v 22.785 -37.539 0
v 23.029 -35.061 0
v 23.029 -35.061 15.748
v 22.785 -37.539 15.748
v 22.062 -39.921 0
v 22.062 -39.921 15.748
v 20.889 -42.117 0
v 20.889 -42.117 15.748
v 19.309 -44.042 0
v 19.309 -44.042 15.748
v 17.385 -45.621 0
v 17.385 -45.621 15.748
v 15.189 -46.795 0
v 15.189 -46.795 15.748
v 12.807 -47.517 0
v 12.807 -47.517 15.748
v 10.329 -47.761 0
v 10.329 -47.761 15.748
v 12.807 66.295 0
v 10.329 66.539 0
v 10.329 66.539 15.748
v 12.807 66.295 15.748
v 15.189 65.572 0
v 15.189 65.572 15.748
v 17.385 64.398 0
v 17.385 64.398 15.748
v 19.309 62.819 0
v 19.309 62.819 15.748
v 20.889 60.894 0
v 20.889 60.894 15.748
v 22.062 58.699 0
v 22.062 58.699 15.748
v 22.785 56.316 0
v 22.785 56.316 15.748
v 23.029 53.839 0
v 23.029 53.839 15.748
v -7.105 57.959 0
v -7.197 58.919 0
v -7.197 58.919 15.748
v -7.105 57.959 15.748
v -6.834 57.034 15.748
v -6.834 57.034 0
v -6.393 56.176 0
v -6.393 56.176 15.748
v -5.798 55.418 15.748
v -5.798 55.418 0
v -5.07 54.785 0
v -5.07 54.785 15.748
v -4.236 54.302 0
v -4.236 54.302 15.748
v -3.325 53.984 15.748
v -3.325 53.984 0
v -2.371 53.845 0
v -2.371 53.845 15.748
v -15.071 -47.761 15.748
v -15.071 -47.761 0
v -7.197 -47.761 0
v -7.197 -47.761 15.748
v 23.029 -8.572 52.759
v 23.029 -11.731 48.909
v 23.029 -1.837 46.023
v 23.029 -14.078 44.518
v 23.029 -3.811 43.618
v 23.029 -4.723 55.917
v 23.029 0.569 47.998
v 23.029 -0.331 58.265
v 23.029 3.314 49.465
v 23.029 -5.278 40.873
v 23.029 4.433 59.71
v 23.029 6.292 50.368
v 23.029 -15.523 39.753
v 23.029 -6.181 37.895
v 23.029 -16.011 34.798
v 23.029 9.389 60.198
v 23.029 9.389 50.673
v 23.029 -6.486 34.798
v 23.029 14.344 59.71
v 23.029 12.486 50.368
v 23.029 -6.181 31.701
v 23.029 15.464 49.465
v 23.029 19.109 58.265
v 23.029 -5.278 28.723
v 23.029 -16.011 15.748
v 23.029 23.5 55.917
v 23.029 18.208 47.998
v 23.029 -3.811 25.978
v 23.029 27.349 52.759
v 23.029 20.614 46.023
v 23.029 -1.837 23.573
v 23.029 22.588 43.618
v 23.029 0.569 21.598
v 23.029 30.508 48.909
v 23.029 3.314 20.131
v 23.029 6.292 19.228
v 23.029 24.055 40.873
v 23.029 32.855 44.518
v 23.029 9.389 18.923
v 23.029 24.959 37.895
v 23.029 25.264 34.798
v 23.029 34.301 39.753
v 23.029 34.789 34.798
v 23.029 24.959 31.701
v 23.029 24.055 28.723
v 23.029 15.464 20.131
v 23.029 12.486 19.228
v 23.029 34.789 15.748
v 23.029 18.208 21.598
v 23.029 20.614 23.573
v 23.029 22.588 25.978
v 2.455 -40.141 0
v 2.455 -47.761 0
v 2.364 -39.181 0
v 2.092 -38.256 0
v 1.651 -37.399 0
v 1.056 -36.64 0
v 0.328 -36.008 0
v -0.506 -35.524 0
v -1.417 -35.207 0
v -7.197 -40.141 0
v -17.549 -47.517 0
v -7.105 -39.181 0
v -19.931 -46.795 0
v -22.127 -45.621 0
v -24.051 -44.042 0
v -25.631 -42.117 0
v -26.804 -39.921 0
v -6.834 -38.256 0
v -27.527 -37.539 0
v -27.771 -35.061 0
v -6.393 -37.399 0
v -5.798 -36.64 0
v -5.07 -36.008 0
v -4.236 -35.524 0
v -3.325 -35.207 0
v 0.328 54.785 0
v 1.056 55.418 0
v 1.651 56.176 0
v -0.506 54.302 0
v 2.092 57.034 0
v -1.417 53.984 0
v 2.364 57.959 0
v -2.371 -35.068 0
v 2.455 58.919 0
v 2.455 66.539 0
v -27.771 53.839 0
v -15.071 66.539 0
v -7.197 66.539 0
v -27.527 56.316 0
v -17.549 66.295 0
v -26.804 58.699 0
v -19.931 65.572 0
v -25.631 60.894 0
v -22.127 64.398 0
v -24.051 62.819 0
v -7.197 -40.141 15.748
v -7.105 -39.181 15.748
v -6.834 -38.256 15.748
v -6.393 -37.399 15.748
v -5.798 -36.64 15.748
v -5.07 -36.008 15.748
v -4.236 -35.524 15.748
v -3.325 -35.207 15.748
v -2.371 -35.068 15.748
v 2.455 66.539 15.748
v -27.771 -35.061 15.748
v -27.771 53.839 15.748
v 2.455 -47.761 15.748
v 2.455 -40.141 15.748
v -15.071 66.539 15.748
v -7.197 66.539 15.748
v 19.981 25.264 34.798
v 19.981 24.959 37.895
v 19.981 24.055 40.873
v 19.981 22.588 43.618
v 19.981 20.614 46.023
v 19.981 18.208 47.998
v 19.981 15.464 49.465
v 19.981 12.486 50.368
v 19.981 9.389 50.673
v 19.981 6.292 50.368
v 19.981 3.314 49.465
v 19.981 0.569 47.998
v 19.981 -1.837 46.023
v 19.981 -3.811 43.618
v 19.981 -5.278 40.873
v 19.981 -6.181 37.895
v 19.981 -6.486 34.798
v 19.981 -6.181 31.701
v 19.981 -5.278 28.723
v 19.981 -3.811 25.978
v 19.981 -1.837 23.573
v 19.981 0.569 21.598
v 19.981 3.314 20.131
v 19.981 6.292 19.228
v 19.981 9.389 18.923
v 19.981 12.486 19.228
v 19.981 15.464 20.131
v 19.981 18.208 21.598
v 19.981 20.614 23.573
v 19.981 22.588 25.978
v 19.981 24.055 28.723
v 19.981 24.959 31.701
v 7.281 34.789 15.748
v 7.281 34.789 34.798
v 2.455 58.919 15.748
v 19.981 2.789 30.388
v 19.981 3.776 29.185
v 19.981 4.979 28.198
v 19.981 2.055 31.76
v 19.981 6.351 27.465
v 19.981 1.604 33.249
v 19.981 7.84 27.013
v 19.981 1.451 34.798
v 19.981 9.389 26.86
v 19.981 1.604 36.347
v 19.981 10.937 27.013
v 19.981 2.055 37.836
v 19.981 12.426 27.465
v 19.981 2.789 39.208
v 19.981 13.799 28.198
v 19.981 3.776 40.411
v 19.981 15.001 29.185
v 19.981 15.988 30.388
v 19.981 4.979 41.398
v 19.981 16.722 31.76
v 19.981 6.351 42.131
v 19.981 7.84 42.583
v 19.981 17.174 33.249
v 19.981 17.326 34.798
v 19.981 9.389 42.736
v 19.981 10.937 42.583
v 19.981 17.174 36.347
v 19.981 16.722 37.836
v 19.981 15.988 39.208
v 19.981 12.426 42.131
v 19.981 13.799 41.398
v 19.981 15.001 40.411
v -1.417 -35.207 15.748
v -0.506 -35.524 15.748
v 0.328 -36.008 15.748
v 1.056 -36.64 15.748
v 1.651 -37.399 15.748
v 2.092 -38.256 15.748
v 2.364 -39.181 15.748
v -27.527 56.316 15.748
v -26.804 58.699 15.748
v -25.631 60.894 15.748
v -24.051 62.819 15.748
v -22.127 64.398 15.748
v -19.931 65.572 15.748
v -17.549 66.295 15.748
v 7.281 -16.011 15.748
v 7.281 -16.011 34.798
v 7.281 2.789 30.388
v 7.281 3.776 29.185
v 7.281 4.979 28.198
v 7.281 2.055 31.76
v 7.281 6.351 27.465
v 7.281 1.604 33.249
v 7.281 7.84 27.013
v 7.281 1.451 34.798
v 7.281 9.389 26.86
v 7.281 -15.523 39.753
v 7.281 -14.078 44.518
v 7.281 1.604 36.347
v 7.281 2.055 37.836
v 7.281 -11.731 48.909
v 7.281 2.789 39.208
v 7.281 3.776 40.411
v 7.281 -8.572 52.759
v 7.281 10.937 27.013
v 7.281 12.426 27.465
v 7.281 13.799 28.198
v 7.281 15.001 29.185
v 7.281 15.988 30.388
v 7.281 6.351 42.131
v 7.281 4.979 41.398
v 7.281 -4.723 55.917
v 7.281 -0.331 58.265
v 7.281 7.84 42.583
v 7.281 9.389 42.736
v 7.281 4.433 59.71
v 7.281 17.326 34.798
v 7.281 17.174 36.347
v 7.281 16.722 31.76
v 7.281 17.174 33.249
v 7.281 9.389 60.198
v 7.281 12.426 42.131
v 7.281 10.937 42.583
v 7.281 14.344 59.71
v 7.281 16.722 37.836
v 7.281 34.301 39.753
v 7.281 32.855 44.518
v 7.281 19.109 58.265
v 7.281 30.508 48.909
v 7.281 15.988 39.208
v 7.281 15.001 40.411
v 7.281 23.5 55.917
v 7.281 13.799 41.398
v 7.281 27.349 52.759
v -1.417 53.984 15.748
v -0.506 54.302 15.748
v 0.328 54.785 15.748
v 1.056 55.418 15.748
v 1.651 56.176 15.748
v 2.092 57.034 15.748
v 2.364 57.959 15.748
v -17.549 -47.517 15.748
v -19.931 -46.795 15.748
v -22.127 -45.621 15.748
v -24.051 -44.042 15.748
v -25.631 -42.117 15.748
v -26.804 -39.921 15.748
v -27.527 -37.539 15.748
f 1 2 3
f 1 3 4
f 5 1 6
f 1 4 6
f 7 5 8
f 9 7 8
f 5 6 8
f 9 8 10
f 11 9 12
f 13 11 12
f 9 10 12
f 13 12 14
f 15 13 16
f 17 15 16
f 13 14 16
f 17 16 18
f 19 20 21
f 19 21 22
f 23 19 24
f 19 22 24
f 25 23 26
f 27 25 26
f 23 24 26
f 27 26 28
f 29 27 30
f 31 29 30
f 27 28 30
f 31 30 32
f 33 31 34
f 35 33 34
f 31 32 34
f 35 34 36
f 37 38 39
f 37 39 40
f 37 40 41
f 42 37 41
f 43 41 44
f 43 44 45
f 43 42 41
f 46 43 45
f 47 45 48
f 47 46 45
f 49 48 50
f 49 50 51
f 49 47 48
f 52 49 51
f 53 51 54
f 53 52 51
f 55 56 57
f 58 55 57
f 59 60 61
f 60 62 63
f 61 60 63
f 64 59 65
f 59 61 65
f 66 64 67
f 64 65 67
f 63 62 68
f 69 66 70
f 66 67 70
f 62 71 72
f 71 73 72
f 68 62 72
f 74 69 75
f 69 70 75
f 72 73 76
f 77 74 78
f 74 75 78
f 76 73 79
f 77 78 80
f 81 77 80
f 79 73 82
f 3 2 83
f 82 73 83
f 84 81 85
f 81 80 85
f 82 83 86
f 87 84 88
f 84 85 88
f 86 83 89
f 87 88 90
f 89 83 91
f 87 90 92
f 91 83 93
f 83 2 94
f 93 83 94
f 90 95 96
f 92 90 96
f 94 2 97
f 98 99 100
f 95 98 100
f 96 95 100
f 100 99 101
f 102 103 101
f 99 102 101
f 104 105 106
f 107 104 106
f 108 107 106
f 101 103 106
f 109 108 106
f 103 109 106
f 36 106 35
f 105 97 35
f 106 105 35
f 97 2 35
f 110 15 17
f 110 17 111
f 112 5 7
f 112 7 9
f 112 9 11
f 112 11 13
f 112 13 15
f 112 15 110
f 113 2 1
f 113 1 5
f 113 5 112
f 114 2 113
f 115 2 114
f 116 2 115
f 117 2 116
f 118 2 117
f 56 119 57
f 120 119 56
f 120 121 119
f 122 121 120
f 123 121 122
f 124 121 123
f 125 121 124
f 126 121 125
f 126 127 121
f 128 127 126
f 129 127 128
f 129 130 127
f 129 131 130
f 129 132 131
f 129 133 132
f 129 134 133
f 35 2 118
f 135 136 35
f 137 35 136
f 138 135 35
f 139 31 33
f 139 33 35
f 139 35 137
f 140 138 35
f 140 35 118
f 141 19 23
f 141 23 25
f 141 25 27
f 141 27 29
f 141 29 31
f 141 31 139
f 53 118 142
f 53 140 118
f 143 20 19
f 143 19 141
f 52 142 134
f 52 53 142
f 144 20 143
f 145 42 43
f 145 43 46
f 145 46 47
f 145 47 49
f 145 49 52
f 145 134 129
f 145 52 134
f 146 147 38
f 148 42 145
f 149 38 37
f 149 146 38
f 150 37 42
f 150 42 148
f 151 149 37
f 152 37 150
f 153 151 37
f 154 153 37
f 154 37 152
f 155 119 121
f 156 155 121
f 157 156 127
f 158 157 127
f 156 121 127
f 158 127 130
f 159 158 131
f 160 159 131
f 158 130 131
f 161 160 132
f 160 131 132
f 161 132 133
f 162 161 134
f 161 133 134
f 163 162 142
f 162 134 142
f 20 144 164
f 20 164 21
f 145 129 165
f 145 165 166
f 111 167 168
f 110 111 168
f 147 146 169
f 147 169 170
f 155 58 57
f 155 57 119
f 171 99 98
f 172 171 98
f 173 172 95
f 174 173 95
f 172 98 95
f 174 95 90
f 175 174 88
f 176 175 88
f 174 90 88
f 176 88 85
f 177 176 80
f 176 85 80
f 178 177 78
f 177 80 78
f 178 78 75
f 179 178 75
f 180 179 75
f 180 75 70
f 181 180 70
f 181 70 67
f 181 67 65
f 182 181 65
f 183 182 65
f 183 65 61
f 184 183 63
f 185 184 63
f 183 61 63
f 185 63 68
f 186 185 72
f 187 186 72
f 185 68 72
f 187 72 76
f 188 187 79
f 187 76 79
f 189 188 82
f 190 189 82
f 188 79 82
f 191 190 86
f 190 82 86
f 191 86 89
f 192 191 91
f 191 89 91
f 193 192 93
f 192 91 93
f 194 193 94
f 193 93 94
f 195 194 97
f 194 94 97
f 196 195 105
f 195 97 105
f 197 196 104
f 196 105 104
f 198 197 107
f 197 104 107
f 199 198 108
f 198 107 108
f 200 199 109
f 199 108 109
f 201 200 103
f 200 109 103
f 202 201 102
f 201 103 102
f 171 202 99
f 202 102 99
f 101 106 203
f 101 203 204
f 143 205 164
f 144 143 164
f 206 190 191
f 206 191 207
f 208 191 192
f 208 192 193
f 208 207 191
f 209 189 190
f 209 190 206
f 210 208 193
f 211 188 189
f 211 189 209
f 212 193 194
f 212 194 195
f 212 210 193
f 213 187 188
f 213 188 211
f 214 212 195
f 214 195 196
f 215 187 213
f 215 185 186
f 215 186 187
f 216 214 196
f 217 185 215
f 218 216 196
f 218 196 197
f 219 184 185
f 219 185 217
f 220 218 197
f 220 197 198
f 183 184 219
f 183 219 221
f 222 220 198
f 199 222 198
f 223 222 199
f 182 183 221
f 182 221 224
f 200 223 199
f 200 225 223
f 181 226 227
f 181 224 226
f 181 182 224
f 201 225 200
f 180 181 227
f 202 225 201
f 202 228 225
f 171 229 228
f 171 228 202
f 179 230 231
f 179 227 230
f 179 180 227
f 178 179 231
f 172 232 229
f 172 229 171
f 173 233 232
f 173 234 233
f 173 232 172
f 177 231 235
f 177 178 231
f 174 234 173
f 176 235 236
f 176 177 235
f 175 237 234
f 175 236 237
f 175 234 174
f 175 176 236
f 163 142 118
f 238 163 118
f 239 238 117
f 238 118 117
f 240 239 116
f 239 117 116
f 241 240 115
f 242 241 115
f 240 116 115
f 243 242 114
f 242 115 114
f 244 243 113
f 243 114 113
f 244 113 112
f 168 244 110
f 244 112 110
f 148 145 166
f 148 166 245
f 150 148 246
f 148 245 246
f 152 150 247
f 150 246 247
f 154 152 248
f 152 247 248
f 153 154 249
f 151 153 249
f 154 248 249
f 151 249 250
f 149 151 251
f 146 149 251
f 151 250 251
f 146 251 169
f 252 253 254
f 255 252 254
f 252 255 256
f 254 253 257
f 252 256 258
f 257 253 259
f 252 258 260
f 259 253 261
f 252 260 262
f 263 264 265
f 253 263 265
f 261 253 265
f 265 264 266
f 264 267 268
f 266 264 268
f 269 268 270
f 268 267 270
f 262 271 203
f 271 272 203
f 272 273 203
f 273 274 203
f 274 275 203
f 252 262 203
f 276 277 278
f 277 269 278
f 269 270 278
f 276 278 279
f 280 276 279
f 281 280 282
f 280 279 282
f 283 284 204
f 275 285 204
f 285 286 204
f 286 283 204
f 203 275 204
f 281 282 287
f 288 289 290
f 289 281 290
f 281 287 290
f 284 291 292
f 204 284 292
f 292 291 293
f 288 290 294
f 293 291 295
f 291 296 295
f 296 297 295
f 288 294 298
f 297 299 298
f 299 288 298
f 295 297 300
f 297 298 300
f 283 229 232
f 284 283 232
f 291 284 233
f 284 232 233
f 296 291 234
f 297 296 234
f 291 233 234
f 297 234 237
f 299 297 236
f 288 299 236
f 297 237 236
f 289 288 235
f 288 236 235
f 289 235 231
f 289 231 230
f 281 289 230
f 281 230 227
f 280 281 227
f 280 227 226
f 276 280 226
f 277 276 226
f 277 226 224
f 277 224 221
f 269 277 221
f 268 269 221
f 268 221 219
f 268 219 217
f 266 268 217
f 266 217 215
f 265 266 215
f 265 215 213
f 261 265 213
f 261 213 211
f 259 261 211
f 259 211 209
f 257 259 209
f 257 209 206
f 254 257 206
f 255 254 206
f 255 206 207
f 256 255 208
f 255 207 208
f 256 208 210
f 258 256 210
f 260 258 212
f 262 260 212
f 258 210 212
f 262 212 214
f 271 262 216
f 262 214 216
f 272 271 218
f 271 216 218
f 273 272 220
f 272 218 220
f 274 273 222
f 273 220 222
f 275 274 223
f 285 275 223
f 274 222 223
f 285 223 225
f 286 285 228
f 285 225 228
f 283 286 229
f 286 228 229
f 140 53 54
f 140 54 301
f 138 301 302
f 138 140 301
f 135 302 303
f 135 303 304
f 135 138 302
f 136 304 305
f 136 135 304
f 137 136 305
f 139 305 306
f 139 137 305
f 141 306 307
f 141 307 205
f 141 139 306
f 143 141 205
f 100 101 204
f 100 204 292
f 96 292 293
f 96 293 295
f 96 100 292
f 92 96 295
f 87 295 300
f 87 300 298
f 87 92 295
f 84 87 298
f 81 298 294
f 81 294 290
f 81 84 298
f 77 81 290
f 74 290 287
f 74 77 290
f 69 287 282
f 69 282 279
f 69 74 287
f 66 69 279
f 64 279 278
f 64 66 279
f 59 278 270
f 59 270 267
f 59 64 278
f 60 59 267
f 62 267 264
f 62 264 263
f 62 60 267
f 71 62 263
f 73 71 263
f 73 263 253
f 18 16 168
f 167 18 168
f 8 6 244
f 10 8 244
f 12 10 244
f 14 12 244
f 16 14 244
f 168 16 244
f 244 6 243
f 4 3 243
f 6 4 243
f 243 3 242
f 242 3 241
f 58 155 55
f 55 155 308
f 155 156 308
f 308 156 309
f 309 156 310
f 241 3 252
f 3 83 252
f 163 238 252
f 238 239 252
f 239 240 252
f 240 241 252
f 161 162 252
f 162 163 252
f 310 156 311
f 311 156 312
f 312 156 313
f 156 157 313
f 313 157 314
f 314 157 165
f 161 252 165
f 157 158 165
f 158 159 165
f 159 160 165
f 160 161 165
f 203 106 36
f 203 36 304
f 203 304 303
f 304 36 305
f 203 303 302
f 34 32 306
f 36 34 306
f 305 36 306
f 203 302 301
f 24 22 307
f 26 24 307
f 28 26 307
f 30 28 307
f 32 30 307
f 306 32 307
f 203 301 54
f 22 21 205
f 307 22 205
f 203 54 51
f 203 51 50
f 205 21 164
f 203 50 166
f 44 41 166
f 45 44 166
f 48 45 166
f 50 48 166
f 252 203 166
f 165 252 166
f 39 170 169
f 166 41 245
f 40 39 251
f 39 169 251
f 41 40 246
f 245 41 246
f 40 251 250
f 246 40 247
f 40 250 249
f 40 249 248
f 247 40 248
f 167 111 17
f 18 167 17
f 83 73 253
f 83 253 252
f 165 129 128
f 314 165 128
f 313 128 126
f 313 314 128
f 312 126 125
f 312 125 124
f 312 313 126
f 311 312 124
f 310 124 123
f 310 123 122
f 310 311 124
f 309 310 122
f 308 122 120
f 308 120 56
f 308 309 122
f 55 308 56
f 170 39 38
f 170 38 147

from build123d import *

# Parameters (mm, degrees)
F0_W        = 50.8
F0_H        = 114.3
F1_DEPTH    = 15.748
F2_W        = 9.652
F2_H        = 12.7
F3_DEPTH    = 25.4
F4_R        = 12.7
F5_T1_DEPTH = 15.748
F7_DEPTH    = 15.748
F8_R        = 15.875
F9_DEPTH    = 3.048
F10_R       = 7.9375
F11_DEPTH   = 25.4


# Not quite as in the source:
# - a fillet or chamfer that OpenCascade refuses, or shapes differently, is made with other operations: its cross-section is extruded or revolved along the edge and cut away or added


with BuildPart() as f1:
    # F0 (on Top) → F1 (new body)
    with BuildSketch(Plane.XY):
        with Locations((-2.3709591478, 9.3886919219)):
            Rectangle(F0_W, F0_H)
    extrude(amount=F1_DEPTH)

    # F2 (on face) → F3 (cut)
    with BuildSketch(Plane.XY.offset(15.748)):
        with Locations((-2.3709591478, -41.4113080781)):
            Rectangle(F2_W, F2_H)
        with Locations((-2.3709591478, 60.1886919219)):
            Rectangle(F2_W, F2_H)
    extrude(amount=-F3_DEPTH, mode=Mode.SUBTRACT)

    # F4
    f4_edges = [f1.edges().sort_by_distance(p)[0] for p in [
        (-27.770959, 66.538692, 7.874),
        (23.029041, 66.538692, 7.874),
        (-27.770959, -47.761308, 7.874),
        (23.029041, -47.761308, 7.874),
    ]]
    fillet(f4_edges, radius=F4_R)

    # F5: fillet of radius 5.08 on 4 edges, made by hand

    # F5_s2 → F5_t1 (join)
    with BuildSketch(Plane.XY):
        with BuildLine():
            ThreePointArc((-2.6249591478, 53.8386919219), (0.9671433006, 55.3265894735), (2.4550408522, 58.9186919219))
            Line((2.4550408522, 58.9186919219), (2.4550408522, 53.8386919219))
            Line((2.4550408522, 53.8386919219), (-2.6249591478, 53.8386919219))
        make_face()
        with BuildLine():
            ThreePointArc((-7.1969591478, 58.9186919219), (-5.7090615962, 55.3265894735), (-2.1169591478, 53.8386919219))
            Line((-2.1169591478, 53.8386919219), (-7.1969591478, 53.8386919219))
            Line((-7.1969591478, 53.8386919219), (-7.1969591478, 58.9186919219))
        make_face()
        with BuildLine():
            ThreePointArc((-2.6249591478, -35.0613080781), (0.9671433006, -36.5492056297), (2.4550408522, -40.1413080781))
            Line((2.4550408522, -40.1413080781), (2.4550408522, -35.0613080781))
            Line((2.4550408522, -35.0613080781), (-2.6249591478, -35.0613080781))
        make_face()
        with BuildLine():
            ThreePointArc((-7.1969591478, -40.1413080781), (-5.7090615962, -36.5492056297), (-2.1169591478, -35.0613080781))
            Line((-2.1169591478, -35.0613080781), (-7.1969591478, -35.0613080781))
            Line((-7.1969591478, -35.0613080781), (-7.1969591478, -40.1413080781))
        make_face()
    extrude(amount=F5_T1_DEPTH)

    # F6 (on face) → F7 (join)
    with BuildSketch(Plane.YZ.offset(23.0290408522)):
        with BuildLine():
            Line((34.7886919219, 15.748), (34.7886919219, 34.798))
            ThreePointArc((34.7886919219, 34.798), (9.3886919219, 60.198), (-16.0113080781, 34.798))
            Line((-16.0113080781, 34.798), (-16.0113080781, 15.748))
            Line((-16.0113080781, 15.748), (34.7886919219, 15.748))
        make_face()
    extrude(amount=-F7_DEPTH)

    # F8 (on face) → F9 (cut)
    with BuildSketch(Plane.YZ.offset(23.0290408522)):
        with Locations((9.3886919219, 34.798)):
            Circle(F8_R)
    extrude(amount=-F9_DEPTH, mode=Mode.SUBTRACT)

    # F10 (on face) → F11 (cut)
    with BuildSketch(Plane.YZ.offset(19.9810408522)):
        with Locations((9.3886919219, 34.798)):
            Circle(F10_R)
    extrude(amount=-F11_DEPTH, mode=Mode.SUBTRACT)


solid = f1.part
